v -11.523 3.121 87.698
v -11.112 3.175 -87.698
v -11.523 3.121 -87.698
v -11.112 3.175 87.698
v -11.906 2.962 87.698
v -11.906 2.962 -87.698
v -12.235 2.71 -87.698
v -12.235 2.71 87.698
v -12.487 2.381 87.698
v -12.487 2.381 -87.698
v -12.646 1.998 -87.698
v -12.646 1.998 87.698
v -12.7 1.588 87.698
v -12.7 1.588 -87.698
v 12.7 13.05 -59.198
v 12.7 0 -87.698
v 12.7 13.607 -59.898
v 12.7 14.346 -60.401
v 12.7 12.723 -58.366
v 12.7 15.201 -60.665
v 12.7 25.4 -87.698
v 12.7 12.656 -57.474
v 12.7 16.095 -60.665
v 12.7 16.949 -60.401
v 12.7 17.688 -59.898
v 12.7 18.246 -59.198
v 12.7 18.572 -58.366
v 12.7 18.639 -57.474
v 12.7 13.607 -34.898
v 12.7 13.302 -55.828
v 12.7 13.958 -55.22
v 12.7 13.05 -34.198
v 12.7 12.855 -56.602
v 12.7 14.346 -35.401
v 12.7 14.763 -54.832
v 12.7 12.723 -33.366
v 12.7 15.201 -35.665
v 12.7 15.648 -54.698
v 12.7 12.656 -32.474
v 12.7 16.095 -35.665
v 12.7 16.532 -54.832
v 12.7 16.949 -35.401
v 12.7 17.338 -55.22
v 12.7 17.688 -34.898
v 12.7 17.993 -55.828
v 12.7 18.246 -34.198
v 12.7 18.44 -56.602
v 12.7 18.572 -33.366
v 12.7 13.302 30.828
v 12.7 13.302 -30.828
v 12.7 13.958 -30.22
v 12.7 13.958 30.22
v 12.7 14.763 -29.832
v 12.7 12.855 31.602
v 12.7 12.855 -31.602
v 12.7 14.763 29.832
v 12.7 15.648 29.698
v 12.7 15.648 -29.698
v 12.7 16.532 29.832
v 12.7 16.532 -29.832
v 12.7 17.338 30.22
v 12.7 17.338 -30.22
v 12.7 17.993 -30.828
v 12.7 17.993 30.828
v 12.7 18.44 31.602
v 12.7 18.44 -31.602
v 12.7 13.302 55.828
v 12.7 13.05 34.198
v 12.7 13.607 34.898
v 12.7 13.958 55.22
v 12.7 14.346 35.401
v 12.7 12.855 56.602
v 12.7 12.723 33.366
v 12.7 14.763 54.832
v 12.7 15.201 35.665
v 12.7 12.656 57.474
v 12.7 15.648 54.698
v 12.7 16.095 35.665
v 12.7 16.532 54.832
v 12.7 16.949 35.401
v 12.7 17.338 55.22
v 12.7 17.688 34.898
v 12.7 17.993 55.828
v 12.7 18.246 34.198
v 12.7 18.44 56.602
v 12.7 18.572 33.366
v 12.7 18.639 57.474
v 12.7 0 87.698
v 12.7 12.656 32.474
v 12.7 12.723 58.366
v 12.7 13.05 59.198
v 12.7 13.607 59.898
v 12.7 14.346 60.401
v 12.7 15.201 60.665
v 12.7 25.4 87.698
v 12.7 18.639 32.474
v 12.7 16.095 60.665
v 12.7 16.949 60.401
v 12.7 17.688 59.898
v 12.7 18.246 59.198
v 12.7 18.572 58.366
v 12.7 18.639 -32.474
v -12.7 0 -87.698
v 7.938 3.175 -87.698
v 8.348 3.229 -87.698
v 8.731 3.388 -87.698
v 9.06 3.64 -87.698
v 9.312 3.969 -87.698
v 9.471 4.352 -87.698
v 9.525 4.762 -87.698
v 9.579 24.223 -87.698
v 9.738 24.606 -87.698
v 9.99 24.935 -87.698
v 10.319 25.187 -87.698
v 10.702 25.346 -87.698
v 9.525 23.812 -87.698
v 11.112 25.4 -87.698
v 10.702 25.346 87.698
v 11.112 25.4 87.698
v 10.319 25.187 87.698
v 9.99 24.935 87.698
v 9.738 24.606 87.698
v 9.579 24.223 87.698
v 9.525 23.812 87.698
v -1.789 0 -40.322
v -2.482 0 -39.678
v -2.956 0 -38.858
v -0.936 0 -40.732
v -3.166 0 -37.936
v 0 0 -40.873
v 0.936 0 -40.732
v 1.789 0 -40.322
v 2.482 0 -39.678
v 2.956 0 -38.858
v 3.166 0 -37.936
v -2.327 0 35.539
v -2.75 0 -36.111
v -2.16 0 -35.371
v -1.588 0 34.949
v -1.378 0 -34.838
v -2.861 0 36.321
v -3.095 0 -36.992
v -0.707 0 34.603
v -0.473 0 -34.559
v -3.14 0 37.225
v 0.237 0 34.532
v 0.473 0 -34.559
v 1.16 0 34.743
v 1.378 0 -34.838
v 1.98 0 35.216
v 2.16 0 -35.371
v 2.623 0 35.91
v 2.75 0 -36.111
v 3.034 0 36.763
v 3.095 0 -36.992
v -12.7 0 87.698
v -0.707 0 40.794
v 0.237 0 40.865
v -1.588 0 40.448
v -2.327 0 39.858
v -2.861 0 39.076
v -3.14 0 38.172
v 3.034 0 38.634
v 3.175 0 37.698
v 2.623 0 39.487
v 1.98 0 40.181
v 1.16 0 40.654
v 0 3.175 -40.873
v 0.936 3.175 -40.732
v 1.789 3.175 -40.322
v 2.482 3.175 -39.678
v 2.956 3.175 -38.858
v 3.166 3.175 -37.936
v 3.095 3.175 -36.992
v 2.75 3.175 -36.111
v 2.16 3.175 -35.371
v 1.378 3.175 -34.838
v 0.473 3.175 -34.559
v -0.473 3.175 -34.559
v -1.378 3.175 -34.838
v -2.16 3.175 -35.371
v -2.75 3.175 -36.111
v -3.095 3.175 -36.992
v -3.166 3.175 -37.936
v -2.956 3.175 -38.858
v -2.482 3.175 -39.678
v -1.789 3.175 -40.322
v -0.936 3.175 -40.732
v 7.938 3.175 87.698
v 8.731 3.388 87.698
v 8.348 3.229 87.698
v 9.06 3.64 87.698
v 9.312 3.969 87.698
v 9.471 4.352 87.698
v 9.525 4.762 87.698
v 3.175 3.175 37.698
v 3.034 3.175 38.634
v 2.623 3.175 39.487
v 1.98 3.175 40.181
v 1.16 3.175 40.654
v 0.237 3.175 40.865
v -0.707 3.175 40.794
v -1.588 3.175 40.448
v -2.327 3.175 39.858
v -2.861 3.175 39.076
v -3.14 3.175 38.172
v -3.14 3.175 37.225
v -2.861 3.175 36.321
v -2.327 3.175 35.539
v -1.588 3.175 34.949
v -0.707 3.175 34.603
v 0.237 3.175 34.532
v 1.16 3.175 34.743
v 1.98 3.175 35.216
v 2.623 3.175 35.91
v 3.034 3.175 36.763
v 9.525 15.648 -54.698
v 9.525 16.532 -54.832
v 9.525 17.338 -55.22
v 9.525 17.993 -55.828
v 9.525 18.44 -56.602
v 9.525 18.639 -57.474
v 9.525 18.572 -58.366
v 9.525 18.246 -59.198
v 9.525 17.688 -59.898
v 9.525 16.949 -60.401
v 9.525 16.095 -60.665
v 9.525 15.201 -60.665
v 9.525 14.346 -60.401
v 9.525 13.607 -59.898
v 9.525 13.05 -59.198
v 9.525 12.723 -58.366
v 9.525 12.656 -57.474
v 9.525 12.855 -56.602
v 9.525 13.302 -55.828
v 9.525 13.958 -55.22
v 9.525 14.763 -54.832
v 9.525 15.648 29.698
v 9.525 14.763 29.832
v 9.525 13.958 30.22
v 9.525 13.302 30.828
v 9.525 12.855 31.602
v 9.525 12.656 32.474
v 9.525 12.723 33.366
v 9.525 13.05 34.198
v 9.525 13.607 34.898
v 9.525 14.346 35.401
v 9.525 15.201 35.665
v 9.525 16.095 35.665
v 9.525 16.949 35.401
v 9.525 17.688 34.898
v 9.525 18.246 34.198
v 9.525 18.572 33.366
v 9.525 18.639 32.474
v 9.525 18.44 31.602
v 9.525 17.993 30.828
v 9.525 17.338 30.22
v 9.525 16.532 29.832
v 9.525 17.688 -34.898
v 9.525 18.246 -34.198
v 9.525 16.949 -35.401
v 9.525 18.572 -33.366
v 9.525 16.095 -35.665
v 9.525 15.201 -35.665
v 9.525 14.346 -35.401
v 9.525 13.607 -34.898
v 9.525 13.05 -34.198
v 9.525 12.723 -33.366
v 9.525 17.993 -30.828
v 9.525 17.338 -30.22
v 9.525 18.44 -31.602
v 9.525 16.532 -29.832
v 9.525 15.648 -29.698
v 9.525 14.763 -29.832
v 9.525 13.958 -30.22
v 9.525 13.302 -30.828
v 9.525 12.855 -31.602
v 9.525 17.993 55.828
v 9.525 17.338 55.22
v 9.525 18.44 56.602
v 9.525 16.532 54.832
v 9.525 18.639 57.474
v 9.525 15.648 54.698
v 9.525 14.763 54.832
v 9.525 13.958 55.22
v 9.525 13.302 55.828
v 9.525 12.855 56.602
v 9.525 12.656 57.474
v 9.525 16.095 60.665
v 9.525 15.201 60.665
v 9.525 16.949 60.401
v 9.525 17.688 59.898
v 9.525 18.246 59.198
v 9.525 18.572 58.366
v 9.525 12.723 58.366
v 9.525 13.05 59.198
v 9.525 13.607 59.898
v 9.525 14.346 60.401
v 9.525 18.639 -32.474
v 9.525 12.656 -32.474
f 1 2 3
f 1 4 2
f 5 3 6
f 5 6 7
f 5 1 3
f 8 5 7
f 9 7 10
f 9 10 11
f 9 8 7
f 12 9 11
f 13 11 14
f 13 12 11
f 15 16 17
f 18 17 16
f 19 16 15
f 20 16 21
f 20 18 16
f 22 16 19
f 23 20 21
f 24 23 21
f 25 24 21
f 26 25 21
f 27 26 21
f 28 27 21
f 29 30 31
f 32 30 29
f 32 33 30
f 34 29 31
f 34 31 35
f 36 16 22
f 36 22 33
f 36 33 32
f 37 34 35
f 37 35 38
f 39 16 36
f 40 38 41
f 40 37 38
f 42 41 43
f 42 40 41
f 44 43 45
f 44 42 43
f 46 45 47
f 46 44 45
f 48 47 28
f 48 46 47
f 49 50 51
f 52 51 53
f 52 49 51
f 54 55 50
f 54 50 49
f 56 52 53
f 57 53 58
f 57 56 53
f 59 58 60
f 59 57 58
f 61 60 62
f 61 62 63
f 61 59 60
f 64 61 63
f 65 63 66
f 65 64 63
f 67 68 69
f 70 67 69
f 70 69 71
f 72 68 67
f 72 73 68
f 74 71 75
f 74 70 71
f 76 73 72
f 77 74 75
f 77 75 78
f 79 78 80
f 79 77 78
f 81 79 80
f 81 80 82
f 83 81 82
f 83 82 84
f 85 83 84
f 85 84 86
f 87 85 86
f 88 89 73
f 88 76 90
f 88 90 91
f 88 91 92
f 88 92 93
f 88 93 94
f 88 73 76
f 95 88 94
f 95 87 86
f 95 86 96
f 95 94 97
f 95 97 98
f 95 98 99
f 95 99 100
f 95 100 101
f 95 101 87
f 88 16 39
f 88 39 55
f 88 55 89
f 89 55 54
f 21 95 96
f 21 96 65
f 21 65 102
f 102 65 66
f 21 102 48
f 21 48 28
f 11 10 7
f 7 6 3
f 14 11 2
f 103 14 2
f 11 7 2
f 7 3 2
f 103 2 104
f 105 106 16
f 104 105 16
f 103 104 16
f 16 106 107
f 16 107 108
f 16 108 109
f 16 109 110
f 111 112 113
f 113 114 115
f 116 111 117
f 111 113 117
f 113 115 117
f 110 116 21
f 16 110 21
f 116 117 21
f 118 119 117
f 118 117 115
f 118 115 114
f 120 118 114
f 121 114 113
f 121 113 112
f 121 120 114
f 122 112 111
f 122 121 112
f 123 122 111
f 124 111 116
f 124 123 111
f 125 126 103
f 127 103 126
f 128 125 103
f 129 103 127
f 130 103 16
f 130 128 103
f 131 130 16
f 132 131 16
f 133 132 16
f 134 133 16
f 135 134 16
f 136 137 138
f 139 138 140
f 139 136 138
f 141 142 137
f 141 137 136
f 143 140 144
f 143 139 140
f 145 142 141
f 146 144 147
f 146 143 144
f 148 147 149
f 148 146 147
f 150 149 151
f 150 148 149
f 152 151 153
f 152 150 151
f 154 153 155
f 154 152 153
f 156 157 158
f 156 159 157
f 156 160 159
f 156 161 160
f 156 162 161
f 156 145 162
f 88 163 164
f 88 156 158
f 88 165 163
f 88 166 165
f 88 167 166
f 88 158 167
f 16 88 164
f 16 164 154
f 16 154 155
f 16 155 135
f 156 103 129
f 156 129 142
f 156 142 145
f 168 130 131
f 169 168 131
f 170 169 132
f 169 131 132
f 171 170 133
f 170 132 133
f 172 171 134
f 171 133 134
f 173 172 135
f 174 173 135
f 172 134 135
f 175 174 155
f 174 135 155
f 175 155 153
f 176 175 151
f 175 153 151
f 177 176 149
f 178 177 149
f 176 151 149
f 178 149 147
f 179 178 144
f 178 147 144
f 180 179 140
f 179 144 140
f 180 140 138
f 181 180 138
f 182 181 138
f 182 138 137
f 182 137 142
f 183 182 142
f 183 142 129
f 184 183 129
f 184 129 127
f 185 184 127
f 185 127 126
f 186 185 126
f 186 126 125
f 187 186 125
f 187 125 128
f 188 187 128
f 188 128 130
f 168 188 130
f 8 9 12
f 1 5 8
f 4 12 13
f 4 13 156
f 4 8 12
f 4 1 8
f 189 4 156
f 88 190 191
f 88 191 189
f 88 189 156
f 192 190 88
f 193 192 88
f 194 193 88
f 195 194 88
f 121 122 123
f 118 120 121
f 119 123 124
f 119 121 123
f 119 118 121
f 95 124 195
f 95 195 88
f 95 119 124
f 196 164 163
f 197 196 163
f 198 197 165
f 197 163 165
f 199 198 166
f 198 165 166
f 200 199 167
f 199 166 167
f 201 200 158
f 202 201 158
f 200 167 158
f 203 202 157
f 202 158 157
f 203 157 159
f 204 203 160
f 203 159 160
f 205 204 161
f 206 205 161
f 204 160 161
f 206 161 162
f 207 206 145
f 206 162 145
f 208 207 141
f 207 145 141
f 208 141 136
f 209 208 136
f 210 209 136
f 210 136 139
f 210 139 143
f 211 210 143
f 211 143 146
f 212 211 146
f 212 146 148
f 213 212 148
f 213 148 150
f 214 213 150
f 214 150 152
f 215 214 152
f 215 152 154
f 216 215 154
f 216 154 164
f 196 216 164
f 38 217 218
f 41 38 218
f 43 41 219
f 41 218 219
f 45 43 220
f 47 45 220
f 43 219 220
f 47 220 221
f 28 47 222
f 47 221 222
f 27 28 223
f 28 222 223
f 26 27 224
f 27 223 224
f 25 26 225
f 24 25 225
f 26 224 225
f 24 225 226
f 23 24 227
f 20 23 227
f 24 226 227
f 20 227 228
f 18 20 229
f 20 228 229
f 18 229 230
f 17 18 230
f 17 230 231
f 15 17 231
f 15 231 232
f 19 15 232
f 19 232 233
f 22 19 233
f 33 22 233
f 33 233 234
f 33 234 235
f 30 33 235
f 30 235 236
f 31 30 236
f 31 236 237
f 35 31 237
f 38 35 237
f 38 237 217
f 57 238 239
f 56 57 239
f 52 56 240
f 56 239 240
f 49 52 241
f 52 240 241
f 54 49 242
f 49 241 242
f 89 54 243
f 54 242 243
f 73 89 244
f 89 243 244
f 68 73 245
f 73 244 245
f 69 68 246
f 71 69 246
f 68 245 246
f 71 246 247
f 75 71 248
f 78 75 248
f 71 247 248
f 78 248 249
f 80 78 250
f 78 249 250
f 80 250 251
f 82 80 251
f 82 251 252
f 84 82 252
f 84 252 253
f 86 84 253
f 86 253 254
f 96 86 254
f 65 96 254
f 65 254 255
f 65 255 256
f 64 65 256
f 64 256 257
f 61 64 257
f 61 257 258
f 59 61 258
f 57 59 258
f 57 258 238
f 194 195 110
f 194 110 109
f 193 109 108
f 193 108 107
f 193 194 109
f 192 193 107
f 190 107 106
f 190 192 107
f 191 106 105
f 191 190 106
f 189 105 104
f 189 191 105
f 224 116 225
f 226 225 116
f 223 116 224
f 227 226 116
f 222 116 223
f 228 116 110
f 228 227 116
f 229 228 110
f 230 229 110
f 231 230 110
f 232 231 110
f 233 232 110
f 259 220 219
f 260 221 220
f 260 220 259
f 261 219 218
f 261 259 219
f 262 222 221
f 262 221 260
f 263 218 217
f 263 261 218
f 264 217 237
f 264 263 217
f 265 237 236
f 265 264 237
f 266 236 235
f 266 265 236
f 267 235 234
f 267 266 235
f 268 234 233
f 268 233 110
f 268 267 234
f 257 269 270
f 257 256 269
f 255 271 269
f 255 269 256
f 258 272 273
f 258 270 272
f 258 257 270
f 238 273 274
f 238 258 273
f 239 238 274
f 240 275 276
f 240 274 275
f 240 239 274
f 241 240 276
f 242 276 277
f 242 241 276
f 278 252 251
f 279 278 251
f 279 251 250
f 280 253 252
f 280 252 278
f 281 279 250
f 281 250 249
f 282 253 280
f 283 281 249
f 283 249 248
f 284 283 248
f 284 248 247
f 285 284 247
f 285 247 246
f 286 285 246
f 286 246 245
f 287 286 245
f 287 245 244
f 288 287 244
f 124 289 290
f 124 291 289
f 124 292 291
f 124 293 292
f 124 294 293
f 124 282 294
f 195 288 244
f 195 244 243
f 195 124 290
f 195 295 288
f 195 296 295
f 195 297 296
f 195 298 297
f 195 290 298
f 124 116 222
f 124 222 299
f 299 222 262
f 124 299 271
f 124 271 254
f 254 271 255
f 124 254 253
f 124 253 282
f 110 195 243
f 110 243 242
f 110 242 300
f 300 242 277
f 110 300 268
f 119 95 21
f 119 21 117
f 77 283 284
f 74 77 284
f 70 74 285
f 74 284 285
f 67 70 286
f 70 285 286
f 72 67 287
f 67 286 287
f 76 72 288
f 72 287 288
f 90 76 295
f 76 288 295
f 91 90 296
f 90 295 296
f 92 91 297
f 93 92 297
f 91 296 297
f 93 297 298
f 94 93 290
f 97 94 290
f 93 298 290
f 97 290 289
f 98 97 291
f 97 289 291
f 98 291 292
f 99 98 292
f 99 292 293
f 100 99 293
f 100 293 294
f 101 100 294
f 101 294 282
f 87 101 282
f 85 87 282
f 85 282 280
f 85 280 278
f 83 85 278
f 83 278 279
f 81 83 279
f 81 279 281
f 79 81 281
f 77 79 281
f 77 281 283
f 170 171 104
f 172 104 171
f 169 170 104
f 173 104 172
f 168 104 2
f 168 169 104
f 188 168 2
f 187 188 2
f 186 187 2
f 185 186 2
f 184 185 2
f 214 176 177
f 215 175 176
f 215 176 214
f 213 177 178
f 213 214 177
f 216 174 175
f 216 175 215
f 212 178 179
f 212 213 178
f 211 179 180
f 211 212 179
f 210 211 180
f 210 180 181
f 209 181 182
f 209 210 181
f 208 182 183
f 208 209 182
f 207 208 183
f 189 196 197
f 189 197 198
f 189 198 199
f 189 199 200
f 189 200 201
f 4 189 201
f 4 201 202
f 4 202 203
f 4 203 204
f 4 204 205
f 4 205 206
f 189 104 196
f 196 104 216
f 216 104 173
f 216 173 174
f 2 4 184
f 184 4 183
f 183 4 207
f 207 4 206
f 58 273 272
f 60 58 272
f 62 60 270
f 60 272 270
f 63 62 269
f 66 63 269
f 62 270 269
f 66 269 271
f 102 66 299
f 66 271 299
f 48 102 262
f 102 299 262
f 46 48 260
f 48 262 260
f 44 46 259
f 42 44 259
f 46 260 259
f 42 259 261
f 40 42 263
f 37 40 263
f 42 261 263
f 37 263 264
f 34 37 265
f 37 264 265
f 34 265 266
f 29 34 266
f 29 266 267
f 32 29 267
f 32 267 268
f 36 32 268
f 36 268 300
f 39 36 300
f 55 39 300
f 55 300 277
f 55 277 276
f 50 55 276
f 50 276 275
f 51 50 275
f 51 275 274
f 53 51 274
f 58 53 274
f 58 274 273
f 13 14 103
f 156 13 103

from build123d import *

# Parameters (mm, degrees)
BOSS_EXTRUDE1_DEPTH = 87.698453
SKETCH3_R           = 3.175
CUT_EXTRUDE1_DEPTH  = 93.181715424
SKETCH4_R           = 3
CUT_EXTRUDE2_DEPTH  = 94.968767596


with BuildPart() as part:
    # Sketch2 → Boss-Extrude1 (new, symmetric)
    with BuildSketch(Plane.XY):
        with BuildLine():
            Line((-12.7, 0), (12.7, 0))
            Line((12.7, 0), (12.7, 25.4))
            Line((12.7, 25.4), (11.1125, 25.4))
            ThreePointArc((11.1125, 25.4), (9.989967985, 24.935032015), (9.525, 23.8125))
            Line((9.525, 23.8125), (9.525, 4.7625))
            ThreePointArc((9.525, 4.7625), (9.060032015, 3.639967985), (7.9375, 3.175))
            Line((7.9375, 3.175), (-11.1125, 3.175))
            ThreePointArc((-11.1125, 3.175), (-12.235032015, 2.710032015), (-12.7, 1.5875))
            Line((-12.7, 1.5875), (-12.7, 0))
        make_face()
    extrude(amount=BOSS_EXTRUDE1_DEPTH, both=True)

    # Sketch3 → Cut-Extrude1 (cut, through all)
    with BuildSketch(Plane.XZ):
        with Locations(Location((0, -37.698453, 0), (0, 0, 270))):
            Circle(SKETCH3_R)
        with Locations((0, 37.698453)):
            Circle(SKETCH3_R)
    extrude(amount=-CUT_EXTRUDE1_DEPTH, mode=Mode.SUBTRACT)

    # Sketch4 → Cut-Extrude2 (cut, through all)
    with BuildSketch(Plane.ZY.offset(-9.525)):
        with Locations((-57.698453, 15.647712404)):
            Circle(SKETCH4_R)
        with Locations((-32.698453, 15.647712404)):
            Circle(SKETCH4_R)
        with Locations(Location((57.698453, 15.647712404, 0), (0, 0, 180))):
            Circle(SKETCH4_R)
        with Locations(Location((32.698453, 15.647712404, 0), (0, 0, 180))):
            Circle(SKETCH4_R)
    extrude(amount=-CUT_EXTRUDE2_DEPTH, mode=Mode.SUBTRACT)


solid = part.part
